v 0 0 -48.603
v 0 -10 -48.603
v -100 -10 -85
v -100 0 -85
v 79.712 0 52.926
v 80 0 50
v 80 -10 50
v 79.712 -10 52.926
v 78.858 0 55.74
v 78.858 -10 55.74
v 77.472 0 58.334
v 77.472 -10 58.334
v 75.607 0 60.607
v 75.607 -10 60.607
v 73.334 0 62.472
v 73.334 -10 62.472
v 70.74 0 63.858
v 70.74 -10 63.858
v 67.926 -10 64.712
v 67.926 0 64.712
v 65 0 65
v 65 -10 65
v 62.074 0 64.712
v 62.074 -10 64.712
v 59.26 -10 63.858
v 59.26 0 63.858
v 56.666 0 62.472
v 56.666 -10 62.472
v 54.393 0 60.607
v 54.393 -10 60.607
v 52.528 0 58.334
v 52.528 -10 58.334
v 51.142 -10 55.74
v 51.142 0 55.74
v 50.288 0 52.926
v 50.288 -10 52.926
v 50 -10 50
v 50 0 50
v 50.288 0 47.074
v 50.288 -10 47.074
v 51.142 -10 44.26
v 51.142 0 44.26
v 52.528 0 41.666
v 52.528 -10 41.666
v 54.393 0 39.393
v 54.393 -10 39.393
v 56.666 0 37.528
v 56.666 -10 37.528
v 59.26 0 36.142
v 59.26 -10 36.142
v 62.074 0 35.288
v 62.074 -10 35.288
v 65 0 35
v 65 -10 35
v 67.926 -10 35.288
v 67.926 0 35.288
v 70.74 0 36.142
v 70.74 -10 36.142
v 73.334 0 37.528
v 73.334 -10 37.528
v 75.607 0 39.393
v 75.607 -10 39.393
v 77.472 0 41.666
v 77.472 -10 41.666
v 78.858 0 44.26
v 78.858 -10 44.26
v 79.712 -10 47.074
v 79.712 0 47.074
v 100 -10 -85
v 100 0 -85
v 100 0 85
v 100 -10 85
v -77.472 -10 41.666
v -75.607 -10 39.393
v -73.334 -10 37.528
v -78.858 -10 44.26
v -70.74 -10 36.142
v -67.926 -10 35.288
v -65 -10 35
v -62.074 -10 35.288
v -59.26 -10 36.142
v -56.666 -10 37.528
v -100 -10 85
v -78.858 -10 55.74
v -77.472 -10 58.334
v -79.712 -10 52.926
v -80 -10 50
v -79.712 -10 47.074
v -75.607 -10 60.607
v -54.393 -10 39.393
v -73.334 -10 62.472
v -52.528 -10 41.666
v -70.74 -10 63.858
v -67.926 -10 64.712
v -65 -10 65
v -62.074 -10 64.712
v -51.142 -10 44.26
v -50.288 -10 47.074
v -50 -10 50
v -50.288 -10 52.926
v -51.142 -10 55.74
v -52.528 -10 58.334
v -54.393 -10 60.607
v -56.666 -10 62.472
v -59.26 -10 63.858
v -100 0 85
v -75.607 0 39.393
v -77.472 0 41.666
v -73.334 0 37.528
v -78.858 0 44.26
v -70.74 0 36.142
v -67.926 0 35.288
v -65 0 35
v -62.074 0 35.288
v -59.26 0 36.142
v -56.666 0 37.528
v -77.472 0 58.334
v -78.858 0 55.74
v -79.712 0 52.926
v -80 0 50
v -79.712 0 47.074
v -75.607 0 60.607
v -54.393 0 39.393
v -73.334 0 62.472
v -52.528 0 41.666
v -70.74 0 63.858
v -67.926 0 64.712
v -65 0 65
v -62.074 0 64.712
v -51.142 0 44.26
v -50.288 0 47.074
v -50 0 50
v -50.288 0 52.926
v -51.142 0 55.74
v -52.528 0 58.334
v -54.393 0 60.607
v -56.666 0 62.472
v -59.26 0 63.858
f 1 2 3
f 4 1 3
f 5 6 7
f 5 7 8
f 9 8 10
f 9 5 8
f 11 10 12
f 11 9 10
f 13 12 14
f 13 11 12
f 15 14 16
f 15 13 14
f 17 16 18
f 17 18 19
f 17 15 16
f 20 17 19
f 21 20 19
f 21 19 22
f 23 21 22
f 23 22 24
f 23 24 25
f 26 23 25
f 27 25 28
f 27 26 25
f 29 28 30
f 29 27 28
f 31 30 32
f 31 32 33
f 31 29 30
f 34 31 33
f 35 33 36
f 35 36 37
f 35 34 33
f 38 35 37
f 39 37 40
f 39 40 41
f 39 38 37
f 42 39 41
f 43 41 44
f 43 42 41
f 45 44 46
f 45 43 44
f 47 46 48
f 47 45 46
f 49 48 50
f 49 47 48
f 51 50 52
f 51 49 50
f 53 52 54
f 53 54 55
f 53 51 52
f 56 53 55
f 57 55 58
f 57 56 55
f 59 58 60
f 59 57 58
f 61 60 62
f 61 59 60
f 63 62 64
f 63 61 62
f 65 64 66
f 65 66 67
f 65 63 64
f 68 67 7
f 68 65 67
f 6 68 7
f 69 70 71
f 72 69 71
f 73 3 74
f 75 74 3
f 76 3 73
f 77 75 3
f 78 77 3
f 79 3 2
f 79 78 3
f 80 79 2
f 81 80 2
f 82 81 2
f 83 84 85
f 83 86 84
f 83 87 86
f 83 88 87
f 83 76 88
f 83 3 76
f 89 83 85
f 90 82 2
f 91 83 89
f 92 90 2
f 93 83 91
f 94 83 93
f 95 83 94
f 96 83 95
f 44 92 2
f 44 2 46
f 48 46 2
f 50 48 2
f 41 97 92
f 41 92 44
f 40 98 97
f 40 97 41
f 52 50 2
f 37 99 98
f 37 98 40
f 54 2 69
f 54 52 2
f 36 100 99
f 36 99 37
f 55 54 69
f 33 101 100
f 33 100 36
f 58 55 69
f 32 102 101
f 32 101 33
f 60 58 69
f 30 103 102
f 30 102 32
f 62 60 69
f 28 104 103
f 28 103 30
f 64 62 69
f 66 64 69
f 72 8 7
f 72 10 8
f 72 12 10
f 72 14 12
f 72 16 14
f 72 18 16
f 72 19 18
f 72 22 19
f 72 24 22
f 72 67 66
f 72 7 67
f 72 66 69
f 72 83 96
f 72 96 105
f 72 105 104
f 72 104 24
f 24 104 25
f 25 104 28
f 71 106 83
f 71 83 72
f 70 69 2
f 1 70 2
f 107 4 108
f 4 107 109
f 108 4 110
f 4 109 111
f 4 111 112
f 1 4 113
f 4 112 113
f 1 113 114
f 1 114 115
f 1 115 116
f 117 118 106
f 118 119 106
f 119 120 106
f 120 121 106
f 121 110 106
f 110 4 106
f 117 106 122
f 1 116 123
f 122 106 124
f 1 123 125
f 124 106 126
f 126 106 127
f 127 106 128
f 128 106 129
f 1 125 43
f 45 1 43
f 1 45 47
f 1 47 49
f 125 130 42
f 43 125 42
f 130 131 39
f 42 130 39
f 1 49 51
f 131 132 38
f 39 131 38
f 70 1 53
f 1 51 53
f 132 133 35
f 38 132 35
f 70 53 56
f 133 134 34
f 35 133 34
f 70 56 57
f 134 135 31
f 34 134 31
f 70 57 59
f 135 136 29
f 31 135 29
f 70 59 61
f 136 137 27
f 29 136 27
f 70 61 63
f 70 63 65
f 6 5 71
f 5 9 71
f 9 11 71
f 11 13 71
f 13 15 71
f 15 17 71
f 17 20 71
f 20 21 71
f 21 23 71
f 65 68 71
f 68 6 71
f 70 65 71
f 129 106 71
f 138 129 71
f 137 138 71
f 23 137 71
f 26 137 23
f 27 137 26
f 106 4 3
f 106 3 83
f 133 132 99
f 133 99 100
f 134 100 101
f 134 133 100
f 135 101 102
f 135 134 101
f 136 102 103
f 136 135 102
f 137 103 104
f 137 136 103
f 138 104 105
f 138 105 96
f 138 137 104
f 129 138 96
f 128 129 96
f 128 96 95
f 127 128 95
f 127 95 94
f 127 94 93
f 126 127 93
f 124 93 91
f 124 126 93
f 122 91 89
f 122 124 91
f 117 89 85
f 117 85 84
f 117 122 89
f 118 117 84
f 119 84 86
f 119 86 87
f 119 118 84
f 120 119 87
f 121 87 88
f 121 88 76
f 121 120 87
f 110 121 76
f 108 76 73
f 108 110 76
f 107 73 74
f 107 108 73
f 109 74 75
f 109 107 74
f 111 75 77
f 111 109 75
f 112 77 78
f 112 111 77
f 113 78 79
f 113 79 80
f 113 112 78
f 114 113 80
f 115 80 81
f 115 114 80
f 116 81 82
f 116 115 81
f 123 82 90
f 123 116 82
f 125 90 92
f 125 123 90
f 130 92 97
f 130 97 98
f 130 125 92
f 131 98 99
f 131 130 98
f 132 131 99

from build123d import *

# Parameters (mm, degrees)
F0_W     = 200
F0_H     = 170
F0_R     = 15
F1_DEPTH = 10
F3_DEPTH = 10.001


with BuildPart() as f1:
    # F0 (on Front) → F1 (new body)
    with BuildSketch(Plane.XZ):
        Rectangle(F0_W, F0_H)
        with Locations((-65, 50)):
            Circle(F0_R, mode=Mode.SUBTRACT)
        with Locations((65, 50)):
            Circle(F0_R, mode=Mode.SUBTRACT)
    extrude(amount=F1_DEPTH)

    # F2 (on face) → F3 (cut, through all)
    with BuildSketch(Plane.XZ.offset(10)):
        Polygon((0, -48.602977), (-100, -85), (100, -85), align=None)
    extrude(amount=-F3_DEPTH, mode=Mode.SUBTRACT)


solid = f1.part
